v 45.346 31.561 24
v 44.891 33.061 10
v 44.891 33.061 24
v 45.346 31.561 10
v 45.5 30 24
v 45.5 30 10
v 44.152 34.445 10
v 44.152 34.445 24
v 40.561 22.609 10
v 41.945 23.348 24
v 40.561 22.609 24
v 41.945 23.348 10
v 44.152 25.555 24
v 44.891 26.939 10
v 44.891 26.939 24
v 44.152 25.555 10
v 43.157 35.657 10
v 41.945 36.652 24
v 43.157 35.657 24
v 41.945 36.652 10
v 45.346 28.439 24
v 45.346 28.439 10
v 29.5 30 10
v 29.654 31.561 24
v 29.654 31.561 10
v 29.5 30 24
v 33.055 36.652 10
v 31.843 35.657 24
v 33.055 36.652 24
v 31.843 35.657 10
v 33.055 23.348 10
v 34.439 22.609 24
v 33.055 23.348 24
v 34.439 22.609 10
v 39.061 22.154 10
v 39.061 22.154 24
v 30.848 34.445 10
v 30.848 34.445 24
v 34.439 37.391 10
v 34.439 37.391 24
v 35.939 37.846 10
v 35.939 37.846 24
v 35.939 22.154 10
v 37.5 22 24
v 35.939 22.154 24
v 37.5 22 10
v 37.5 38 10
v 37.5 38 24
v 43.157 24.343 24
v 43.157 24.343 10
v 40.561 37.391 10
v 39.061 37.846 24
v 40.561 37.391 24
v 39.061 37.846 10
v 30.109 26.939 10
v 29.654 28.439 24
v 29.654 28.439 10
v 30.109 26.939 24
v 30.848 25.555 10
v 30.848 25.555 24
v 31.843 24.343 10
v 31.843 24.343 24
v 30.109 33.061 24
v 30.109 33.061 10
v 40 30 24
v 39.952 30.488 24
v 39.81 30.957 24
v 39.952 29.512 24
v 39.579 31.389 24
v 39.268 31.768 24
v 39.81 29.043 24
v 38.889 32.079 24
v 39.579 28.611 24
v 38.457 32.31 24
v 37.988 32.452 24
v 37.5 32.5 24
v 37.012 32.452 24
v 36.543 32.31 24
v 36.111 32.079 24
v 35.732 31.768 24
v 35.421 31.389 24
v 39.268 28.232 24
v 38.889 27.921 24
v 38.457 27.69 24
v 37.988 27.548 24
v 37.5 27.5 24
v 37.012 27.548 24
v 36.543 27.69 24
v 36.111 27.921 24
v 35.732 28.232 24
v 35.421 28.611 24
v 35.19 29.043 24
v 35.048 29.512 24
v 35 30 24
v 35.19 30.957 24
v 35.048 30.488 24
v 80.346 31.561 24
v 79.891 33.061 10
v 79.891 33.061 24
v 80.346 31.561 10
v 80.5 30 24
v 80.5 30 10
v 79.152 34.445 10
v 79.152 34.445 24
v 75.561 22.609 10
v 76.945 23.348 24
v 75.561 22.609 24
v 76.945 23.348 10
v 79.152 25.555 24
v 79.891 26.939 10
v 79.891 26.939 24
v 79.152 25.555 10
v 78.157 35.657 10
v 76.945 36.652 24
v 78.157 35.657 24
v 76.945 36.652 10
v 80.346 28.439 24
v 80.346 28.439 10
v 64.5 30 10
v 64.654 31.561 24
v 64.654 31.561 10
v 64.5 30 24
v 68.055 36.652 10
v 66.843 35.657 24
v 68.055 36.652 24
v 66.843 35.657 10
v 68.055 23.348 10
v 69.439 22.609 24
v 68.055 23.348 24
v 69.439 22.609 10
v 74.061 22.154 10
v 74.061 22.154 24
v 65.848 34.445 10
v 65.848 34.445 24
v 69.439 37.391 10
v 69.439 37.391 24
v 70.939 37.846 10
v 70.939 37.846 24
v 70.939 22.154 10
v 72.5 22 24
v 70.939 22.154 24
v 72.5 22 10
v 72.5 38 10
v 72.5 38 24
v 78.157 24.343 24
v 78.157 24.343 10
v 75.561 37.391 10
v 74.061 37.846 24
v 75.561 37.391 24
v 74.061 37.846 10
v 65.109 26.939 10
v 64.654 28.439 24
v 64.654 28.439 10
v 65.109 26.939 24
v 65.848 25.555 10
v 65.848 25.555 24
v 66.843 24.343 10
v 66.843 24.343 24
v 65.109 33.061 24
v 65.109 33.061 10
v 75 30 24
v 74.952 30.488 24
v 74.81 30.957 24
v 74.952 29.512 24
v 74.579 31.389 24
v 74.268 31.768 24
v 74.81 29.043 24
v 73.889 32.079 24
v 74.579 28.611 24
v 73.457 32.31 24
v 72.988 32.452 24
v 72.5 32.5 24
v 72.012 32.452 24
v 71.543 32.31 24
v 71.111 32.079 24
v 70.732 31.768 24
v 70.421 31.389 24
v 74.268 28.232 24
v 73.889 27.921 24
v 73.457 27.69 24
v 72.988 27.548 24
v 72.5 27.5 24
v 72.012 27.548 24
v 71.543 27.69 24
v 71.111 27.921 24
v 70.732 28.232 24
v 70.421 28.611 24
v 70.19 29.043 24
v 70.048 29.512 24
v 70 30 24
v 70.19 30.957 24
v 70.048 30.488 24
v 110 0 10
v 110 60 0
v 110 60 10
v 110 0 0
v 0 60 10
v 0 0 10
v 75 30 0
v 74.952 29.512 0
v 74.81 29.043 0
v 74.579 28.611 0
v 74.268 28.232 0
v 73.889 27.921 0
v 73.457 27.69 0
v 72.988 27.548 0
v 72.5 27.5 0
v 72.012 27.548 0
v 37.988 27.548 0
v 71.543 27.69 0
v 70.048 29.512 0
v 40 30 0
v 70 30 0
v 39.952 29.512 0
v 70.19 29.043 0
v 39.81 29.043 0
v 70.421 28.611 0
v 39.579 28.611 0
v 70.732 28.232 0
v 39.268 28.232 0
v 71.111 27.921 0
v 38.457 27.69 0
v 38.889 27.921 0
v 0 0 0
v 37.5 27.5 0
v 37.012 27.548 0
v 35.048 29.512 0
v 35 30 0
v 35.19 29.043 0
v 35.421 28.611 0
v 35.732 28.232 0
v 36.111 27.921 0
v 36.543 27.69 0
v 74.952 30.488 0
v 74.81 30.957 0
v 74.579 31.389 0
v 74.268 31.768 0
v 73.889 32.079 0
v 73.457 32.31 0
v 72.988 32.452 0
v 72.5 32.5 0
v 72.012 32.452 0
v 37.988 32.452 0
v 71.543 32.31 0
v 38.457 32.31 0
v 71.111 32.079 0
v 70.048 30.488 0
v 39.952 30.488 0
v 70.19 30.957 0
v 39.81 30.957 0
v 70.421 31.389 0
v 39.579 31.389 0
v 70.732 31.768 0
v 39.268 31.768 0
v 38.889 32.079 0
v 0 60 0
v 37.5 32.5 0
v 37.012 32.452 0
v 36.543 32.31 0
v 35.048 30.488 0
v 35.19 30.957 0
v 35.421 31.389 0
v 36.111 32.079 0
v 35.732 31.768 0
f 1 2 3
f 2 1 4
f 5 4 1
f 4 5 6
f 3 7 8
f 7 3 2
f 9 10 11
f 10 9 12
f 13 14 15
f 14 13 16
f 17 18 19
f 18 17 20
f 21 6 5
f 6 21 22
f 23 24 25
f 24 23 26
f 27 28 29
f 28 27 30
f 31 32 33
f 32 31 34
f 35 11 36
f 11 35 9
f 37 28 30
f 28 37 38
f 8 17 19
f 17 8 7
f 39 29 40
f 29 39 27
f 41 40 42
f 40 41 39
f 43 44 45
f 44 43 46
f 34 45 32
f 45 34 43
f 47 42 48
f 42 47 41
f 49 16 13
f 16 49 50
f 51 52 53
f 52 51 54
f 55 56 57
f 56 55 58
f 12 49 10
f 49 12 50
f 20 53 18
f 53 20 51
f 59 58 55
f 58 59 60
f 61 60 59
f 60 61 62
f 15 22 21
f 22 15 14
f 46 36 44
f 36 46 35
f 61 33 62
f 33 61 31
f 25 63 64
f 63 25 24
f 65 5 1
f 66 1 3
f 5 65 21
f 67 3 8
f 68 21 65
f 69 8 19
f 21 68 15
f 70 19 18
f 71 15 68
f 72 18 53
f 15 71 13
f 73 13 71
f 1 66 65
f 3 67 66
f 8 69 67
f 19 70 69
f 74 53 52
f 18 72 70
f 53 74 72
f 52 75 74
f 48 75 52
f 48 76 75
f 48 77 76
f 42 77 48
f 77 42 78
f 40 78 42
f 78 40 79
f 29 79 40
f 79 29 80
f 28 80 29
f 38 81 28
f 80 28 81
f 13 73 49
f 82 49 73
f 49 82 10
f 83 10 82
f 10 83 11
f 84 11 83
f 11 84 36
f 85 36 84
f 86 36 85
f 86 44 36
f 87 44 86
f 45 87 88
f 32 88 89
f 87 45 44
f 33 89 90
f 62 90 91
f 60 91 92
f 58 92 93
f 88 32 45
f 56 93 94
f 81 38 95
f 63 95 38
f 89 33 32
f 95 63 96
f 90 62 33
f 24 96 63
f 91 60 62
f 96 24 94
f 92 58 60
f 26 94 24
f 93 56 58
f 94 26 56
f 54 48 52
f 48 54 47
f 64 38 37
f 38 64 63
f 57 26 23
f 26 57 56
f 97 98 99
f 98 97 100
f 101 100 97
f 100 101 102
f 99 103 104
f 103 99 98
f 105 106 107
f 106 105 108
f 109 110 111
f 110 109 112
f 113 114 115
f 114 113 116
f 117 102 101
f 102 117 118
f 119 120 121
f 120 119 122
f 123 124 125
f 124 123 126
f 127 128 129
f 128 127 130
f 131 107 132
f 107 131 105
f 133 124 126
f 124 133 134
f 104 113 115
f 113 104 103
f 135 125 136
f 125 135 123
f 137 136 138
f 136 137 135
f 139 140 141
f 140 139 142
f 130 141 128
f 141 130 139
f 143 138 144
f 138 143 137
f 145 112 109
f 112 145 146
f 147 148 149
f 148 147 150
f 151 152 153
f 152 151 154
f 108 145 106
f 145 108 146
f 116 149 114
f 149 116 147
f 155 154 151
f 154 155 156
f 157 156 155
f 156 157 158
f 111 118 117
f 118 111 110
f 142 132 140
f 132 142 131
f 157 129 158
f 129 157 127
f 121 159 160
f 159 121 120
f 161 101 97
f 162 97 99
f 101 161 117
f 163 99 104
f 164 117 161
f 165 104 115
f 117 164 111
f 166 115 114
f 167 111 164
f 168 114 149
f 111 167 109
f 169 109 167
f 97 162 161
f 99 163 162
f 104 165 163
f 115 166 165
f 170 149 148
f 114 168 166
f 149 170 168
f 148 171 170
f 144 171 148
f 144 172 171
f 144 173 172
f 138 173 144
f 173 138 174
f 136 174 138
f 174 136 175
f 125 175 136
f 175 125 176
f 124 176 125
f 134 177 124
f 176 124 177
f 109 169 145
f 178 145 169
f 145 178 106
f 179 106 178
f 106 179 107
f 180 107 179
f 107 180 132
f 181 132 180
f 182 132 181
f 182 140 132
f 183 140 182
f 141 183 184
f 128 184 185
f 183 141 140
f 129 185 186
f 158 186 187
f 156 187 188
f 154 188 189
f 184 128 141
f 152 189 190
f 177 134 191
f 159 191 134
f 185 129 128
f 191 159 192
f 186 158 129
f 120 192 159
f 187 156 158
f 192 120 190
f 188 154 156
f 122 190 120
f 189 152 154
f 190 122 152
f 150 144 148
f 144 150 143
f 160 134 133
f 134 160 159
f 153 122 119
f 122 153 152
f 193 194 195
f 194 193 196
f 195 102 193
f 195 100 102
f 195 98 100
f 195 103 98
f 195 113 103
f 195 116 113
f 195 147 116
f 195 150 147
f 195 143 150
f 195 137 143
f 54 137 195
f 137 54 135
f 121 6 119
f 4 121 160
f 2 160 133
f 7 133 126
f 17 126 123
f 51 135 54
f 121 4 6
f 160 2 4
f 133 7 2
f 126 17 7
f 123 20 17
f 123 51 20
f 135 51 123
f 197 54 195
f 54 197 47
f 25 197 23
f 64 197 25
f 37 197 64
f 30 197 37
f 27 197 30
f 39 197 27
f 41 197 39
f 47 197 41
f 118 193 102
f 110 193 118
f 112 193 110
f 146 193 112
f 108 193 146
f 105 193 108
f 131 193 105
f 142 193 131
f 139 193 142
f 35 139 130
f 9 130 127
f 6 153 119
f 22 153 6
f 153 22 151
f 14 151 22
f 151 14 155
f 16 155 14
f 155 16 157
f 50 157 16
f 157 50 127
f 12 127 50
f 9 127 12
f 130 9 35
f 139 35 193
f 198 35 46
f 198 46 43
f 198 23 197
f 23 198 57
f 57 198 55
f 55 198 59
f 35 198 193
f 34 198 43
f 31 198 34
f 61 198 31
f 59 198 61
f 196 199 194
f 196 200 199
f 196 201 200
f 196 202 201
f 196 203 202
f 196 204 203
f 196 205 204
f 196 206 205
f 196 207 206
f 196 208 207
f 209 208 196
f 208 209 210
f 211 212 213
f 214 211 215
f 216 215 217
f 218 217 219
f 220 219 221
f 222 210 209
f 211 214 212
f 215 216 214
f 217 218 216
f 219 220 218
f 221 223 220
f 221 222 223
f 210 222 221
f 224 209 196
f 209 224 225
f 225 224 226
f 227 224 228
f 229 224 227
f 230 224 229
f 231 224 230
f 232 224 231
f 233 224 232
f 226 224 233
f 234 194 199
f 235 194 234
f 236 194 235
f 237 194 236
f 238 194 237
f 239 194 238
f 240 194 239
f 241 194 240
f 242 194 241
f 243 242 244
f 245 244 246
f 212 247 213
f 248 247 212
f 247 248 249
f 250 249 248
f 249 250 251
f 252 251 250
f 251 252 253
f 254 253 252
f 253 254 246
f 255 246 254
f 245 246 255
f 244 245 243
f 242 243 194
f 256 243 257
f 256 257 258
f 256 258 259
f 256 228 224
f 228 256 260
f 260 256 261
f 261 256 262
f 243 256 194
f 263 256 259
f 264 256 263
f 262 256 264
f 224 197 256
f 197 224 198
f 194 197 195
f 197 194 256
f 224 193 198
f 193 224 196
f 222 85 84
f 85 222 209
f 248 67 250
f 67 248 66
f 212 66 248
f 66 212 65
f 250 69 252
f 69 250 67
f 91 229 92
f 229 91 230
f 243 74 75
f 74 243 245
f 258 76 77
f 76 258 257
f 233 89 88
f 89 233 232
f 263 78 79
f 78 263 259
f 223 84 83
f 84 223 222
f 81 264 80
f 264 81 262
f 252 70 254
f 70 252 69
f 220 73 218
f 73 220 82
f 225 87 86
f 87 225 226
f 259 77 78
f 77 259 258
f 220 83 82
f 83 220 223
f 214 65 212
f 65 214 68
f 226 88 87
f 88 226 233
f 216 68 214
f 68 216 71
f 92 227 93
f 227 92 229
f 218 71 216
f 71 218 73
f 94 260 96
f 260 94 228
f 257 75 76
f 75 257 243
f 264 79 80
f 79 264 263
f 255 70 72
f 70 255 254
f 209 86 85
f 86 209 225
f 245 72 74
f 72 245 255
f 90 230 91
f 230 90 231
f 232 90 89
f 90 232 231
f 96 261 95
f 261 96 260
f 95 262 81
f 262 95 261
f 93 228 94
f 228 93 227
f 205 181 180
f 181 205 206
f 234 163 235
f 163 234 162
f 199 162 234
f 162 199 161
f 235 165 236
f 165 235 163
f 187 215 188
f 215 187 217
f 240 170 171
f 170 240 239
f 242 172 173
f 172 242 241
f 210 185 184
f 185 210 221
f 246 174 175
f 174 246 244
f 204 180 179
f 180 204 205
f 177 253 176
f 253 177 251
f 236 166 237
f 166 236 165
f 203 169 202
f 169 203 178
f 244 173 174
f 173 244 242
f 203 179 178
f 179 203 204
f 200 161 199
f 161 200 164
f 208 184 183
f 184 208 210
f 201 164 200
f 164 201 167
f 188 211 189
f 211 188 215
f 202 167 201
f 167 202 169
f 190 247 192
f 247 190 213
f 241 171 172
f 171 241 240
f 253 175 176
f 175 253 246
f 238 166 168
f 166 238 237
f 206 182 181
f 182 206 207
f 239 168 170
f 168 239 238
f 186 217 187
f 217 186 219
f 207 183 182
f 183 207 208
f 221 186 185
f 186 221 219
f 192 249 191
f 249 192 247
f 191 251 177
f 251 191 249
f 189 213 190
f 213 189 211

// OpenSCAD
$fn = 32;

// ----------------------------------------------------------------------
// Drill jig: two_boss jig
// ----------------------------------------------------------------------

// --- parameters (mm) ---
plate_l = 110;            // plate length, X
plate_w = 60;             // plate width, Y
plate_t = 10;             // plate thickness
boss_d = 16;              // guide boss diameter
boss_h = 15;              // boss height above the plate
guide_d = 5;              // guide hole diameter
boss_pitch = 35;          // boss pitch

n_boss = 2;  // guide bosses
boss_x0 = (plate_l - (n_boss - 1) * boss_pitch) / 2;  // first boss X
boss_top = plate_t - 1 + boss_h;  // boss crown height
total_h = boss_top;  // overall height

difference() {
  union() {
  cube([plate_l, plate_w, plate_t]);
  for (i = [0 : n_boss - 1])
    translate([boss_x0 + i * boss_pitch, plate_w / 2, plate_t - 1])
      cylinder(h = boss_h, d = boss_d);
  }
  for (i = [0 : n_boss - 1])
    translate([boss_x0 + i * boss_pitch, plate_w / 2, -1])
      cylinder(h = plate_t + boss_h, d = guide_d);
}
